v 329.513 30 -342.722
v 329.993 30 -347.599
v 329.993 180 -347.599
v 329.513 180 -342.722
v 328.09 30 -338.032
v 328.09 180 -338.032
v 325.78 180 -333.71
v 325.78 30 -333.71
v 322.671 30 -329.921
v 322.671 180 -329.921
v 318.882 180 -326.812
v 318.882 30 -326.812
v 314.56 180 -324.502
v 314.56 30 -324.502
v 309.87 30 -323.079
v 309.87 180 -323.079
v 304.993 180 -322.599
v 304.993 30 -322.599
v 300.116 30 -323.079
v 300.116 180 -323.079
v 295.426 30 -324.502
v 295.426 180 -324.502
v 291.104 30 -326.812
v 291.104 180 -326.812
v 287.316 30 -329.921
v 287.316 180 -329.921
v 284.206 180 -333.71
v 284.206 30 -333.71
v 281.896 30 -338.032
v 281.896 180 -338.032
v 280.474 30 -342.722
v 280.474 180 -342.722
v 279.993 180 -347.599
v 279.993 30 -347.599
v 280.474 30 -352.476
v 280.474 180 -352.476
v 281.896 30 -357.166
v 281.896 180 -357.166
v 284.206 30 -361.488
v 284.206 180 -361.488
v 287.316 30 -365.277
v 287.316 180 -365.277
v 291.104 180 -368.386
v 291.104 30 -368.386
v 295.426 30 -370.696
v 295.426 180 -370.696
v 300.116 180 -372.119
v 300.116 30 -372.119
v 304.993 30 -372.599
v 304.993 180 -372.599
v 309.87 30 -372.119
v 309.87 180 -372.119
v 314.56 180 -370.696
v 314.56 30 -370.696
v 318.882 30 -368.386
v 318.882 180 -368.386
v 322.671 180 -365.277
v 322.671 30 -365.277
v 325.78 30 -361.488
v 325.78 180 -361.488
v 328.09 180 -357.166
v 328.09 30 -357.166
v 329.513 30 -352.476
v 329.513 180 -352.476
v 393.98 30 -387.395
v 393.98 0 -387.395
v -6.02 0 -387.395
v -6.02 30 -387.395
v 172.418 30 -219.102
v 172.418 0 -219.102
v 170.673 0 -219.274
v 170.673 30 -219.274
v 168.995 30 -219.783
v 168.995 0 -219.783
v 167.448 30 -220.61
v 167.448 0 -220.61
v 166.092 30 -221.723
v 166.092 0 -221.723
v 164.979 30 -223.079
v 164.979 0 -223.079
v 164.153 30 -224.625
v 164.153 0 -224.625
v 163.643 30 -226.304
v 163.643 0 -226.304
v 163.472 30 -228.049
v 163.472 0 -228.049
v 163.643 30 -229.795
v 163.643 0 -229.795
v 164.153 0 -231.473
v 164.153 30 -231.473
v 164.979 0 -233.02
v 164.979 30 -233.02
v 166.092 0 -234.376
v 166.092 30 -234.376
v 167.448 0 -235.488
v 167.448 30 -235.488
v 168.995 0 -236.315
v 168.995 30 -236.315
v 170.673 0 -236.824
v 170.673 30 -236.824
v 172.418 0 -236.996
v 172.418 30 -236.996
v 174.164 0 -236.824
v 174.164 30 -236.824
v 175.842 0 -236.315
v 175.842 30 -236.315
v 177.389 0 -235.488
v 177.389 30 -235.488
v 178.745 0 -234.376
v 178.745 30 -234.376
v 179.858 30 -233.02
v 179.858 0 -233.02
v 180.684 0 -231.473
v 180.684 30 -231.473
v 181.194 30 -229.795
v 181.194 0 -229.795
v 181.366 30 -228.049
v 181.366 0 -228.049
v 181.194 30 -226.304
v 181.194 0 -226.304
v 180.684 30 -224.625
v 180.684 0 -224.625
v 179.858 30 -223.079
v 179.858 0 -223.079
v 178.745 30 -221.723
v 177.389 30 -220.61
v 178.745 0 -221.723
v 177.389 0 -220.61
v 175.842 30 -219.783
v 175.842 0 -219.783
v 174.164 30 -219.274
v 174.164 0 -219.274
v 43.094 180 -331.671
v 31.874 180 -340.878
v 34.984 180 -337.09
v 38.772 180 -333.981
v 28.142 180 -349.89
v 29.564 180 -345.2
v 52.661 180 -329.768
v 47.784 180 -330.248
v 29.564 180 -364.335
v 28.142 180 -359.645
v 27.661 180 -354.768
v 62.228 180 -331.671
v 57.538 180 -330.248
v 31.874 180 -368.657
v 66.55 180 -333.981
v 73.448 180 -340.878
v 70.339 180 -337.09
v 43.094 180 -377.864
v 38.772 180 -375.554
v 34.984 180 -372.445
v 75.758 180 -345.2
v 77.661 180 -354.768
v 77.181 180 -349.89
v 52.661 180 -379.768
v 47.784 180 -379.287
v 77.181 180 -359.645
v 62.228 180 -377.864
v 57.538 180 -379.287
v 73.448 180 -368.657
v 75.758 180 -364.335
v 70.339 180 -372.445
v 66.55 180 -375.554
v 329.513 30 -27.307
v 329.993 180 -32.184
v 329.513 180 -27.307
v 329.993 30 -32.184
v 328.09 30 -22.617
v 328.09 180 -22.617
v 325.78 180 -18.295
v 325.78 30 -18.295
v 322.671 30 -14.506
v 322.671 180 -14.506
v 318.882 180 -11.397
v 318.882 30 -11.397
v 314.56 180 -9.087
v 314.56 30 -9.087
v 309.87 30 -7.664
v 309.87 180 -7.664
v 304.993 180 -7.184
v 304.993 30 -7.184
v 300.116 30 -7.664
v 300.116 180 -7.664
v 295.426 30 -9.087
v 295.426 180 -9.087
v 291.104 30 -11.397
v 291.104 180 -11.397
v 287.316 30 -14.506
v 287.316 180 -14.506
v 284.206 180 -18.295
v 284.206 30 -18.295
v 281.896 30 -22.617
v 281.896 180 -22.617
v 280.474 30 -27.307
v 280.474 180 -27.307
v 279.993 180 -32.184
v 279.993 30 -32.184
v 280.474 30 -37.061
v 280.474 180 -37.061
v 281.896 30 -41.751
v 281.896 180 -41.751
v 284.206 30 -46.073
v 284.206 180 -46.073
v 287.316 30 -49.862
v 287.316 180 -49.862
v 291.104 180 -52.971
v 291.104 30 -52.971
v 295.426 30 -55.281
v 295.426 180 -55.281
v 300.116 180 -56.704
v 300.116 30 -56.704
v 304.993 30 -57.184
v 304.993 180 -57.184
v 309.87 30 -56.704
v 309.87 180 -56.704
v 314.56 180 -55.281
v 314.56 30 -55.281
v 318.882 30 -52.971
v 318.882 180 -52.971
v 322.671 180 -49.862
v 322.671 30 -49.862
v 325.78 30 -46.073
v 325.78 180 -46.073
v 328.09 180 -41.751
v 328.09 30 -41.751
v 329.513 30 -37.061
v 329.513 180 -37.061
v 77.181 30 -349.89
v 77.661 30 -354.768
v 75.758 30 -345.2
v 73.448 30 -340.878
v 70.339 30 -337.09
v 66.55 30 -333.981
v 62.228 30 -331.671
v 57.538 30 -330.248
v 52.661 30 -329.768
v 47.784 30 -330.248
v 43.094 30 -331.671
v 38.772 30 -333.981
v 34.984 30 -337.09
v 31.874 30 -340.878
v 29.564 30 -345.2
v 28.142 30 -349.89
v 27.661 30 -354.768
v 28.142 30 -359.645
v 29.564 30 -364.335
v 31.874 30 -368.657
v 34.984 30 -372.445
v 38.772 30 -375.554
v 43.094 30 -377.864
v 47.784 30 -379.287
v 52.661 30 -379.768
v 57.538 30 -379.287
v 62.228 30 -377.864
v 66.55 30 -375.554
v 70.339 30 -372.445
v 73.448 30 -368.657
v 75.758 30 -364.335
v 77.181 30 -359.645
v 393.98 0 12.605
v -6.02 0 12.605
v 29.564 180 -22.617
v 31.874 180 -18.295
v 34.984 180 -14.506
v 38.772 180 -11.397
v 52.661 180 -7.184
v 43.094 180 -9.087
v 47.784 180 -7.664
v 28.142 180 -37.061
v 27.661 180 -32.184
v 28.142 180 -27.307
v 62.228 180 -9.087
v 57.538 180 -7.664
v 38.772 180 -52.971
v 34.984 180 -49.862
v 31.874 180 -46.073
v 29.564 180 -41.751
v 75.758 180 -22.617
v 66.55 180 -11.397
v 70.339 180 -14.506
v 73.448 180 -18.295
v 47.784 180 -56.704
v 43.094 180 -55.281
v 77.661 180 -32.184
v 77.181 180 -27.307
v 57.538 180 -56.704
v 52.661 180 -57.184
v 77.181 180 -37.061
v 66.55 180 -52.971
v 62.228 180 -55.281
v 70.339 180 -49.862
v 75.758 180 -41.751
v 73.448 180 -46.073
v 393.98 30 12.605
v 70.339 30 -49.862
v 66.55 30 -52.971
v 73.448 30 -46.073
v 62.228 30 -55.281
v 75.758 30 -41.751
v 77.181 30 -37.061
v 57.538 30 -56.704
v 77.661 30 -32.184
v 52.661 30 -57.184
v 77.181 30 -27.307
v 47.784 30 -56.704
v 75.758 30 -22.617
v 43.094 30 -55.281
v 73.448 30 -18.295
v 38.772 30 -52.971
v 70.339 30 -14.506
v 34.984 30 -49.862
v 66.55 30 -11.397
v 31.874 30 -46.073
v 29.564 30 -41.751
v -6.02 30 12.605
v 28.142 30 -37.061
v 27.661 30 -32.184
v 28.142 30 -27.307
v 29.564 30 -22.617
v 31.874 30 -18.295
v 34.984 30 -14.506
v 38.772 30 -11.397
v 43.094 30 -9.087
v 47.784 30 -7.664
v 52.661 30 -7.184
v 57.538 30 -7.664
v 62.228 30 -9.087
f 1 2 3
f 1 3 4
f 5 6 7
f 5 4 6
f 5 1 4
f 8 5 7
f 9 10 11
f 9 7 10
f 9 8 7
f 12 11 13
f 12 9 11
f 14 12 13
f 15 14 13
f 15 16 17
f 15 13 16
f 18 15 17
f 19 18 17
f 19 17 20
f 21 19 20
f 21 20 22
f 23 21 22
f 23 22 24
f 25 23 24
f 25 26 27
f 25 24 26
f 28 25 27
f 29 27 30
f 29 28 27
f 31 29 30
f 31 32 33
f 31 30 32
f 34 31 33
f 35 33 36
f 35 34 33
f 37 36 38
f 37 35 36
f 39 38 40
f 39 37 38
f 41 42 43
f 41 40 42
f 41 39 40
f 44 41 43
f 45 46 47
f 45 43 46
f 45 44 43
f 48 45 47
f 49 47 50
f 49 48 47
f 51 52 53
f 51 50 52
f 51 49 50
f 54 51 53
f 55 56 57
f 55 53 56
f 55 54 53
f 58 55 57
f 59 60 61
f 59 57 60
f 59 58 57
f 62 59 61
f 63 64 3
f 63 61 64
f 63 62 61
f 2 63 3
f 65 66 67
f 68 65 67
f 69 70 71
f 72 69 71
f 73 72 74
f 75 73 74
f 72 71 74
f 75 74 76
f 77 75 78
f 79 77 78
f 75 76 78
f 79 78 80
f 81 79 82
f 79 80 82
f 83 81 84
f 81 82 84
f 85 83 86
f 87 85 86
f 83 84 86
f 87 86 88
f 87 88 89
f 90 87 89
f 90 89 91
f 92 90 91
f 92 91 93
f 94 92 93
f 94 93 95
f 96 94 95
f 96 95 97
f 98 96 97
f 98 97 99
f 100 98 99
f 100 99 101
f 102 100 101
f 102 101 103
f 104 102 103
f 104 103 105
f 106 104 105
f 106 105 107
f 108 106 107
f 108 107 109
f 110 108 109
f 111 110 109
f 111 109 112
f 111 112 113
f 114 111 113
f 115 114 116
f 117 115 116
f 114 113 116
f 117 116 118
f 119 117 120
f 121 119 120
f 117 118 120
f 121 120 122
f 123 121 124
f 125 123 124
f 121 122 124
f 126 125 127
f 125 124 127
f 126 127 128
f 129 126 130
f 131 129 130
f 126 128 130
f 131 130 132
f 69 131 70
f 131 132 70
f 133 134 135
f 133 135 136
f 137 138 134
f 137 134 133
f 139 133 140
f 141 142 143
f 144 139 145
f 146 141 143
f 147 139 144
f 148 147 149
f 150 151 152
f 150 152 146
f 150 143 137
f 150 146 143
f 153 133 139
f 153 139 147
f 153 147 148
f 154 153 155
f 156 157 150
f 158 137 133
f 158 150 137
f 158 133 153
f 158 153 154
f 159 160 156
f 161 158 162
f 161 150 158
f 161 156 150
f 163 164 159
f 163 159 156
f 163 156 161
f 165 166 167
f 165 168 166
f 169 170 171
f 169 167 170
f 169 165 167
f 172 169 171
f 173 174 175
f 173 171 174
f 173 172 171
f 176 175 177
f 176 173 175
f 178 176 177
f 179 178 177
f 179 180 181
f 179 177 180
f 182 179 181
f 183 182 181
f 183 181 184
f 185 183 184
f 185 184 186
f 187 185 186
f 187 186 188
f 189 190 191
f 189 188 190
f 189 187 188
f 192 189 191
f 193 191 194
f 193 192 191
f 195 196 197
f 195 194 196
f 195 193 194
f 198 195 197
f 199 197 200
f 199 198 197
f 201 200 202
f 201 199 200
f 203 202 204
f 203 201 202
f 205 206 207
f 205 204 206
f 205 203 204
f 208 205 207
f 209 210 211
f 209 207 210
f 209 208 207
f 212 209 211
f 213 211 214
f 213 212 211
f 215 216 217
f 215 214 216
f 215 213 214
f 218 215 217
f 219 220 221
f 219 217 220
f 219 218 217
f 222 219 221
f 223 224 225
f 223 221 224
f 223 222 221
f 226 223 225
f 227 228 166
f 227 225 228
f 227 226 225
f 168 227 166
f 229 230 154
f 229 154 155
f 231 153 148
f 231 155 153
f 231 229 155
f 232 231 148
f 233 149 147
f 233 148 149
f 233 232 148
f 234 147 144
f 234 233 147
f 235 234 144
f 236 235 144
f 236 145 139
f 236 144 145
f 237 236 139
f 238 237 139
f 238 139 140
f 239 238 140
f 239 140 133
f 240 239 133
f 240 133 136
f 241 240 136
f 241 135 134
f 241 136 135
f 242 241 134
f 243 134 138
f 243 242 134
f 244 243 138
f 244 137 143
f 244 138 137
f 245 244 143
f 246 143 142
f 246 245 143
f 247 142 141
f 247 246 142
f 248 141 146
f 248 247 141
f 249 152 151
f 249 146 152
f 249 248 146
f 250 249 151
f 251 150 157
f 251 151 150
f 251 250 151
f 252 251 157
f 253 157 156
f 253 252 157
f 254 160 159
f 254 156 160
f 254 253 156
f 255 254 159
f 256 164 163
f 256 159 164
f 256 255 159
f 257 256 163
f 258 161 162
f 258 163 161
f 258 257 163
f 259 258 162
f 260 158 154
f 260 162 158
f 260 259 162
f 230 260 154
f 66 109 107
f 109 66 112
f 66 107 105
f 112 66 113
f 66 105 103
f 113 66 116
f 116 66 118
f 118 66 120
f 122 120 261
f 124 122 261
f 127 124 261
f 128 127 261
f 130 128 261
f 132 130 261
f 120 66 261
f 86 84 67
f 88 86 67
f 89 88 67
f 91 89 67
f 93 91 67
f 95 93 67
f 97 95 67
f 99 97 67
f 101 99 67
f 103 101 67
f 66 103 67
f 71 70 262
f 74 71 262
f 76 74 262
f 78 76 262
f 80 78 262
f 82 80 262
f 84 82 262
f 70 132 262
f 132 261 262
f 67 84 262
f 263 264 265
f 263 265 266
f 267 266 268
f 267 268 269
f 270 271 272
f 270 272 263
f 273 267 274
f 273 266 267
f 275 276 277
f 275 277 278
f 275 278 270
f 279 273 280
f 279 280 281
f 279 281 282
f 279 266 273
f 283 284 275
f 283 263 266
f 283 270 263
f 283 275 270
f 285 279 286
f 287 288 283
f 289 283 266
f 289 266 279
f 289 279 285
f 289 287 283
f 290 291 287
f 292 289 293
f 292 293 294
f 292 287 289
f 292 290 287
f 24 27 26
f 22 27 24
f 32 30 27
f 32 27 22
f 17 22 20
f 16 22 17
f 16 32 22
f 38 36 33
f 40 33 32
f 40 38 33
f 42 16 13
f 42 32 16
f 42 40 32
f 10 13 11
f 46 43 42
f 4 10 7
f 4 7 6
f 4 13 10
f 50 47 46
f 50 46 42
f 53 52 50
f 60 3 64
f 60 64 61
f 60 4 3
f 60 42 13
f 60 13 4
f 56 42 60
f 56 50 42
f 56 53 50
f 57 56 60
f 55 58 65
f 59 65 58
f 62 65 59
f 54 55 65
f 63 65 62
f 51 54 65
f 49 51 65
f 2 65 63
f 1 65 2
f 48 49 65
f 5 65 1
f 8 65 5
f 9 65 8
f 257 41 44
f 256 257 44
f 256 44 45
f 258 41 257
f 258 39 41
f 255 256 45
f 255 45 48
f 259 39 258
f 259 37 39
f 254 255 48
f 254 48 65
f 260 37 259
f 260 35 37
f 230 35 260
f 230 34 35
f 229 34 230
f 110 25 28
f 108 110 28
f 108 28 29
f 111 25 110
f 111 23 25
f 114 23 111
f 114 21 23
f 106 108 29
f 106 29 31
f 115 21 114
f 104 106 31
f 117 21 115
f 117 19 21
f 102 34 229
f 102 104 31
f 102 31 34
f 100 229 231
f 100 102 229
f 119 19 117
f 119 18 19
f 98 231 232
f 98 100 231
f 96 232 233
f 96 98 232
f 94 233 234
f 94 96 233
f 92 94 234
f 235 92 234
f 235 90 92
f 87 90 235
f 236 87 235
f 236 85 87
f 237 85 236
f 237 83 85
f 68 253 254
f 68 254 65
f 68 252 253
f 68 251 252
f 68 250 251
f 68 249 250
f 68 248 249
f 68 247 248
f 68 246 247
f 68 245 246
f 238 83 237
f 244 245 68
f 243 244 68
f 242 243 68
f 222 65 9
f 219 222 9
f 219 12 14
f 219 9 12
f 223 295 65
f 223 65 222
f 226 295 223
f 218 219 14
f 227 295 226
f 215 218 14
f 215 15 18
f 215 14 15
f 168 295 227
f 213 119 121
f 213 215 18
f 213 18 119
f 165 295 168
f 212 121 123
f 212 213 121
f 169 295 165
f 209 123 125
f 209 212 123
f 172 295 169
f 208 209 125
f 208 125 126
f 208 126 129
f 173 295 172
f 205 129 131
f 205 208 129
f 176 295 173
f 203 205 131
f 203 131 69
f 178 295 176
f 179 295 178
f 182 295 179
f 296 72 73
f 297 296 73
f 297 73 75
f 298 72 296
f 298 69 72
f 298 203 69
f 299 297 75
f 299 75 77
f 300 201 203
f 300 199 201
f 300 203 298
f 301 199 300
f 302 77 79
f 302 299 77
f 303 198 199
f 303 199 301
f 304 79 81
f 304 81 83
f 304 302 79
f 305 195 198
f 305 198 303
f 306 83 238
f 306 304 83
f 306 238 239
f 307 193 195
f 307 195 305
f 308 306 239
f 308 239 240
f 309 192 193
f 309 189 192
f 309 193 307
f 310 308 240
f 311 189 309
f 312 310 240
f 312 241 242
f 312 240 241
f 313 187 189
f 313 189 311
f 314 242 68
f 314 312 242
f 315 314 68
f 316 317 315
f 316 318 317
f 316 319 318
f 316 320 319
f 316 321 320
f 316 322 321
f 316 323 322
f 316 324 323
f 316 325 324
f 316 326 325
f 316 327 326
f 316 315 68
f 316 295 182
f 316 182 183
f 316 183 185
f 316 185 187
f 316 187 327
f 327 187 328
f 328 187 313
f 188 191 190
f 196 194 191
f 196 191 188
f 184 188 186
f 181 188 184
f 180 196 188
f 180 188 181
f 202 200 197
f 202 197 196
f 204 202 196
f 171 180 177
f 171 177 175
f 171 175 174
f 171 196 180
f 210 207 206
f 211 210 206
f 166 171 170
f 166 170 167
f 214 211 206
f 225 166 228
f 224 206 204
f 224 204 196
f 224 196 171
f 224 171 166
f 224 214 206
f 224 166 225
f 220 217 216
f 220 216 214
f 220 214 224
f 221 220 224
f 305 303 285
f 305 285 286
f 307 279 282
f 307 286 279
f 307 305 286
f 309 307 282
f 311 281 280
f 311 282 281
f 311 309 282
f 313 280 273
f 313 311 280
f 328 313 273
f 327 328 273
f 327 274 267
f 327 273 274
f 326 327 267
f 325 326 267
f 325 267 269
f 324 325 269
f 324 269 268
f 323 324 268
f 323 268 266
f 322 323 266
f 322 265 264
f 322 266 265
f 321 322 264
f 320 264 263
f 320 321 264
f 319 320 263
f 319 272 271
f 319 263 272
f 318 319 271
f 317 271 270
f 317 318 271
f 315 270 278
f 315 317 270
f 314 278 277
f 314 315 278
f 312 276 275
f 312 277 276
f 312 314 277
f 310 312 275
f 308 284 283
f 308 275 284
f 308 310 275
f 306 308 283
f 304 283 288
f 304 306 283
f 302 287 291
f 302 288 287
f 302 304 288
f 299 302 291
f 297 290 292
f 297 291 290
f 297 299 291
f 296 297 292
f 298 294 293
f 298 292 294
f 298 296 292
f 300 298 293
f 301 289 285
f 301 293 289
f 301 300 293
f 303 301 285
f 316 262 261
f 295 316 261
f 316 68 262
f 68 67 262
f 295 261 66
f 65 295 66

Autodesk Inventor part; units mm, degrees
ref_plane "YZ Plane" through (0, 0, 0) normal (1, 0, 0) x (0, 1, 0)
ref_plane "XZ Plane" through (0, 0, 0) normal (0, 1, 0) x (-1, 0, 0)
ref_plane "XY Plane" through (0, 0, 0) normal (0, 0, 1) x (1, 0, 0)
sketch "Sketch1" plane through (0, 0, 0) normal (0, 1, 0) x (-1, 0, 0)
  line L0 (6.0199, 12.6049) -> (-393.9801, 12.6049)
  line L1 (-393.9801, 12.6049) -> (-393.9801, -387.3951)
  line L2 (-393.9801, -387.3951) -> (6.0199, -387.3951)
  line L3 (6.0199, -387.3951) -> (6.0199, 12.6049)
  point P0 (0, 0)
  dimension "d0" = 400
  dimension "d1" = 400
  dimension "d2" = 400
extrude "Extrusion1" add sketch "Sketch1" along normal blind 30
sketch "Sketch2" plane through (0, 30, 0) normal (0, 1, 0) x (1, 0, 0)
  circle A0 centre (52.6612, 32.1839) radius 25
  circle A1 centre (304.9932, 32.1839) radius 25
  circle A2 centre (304.9932, 347.5989) radius 25
  circle A3 centre (52.6612, 354.7675) radius 25
  point P0 (0, 0)
  dimension "d5" = 50
  dimension "d6" = 50
  dimension "d7" = 50
  dimension "d8" = 50
extrude "Extrusion2" add sketch "Sketch2" along normal blind 150
sketch "Sketch3" plane through (0, 0, 0) normal (0, -1, 0) x (1, 0, 0)
  point P0 (0, 0)
sketch "Sketch4" plane through (0, 30, 0) normal (0, 1, 0) x (1, 0, 0)
  point P0 (0, 0)
  point P1 (172.4185, 228.0493)
hole "Hole1" at (172.4185, 30, -228.0493) direction (0, -1, 0) diameter 17.894 depth 53.975 tip angle 118 thread size "13/16-10 UNC" class "2B" standard "ANSI Unified Screw Threads"
properties part number "base1"
